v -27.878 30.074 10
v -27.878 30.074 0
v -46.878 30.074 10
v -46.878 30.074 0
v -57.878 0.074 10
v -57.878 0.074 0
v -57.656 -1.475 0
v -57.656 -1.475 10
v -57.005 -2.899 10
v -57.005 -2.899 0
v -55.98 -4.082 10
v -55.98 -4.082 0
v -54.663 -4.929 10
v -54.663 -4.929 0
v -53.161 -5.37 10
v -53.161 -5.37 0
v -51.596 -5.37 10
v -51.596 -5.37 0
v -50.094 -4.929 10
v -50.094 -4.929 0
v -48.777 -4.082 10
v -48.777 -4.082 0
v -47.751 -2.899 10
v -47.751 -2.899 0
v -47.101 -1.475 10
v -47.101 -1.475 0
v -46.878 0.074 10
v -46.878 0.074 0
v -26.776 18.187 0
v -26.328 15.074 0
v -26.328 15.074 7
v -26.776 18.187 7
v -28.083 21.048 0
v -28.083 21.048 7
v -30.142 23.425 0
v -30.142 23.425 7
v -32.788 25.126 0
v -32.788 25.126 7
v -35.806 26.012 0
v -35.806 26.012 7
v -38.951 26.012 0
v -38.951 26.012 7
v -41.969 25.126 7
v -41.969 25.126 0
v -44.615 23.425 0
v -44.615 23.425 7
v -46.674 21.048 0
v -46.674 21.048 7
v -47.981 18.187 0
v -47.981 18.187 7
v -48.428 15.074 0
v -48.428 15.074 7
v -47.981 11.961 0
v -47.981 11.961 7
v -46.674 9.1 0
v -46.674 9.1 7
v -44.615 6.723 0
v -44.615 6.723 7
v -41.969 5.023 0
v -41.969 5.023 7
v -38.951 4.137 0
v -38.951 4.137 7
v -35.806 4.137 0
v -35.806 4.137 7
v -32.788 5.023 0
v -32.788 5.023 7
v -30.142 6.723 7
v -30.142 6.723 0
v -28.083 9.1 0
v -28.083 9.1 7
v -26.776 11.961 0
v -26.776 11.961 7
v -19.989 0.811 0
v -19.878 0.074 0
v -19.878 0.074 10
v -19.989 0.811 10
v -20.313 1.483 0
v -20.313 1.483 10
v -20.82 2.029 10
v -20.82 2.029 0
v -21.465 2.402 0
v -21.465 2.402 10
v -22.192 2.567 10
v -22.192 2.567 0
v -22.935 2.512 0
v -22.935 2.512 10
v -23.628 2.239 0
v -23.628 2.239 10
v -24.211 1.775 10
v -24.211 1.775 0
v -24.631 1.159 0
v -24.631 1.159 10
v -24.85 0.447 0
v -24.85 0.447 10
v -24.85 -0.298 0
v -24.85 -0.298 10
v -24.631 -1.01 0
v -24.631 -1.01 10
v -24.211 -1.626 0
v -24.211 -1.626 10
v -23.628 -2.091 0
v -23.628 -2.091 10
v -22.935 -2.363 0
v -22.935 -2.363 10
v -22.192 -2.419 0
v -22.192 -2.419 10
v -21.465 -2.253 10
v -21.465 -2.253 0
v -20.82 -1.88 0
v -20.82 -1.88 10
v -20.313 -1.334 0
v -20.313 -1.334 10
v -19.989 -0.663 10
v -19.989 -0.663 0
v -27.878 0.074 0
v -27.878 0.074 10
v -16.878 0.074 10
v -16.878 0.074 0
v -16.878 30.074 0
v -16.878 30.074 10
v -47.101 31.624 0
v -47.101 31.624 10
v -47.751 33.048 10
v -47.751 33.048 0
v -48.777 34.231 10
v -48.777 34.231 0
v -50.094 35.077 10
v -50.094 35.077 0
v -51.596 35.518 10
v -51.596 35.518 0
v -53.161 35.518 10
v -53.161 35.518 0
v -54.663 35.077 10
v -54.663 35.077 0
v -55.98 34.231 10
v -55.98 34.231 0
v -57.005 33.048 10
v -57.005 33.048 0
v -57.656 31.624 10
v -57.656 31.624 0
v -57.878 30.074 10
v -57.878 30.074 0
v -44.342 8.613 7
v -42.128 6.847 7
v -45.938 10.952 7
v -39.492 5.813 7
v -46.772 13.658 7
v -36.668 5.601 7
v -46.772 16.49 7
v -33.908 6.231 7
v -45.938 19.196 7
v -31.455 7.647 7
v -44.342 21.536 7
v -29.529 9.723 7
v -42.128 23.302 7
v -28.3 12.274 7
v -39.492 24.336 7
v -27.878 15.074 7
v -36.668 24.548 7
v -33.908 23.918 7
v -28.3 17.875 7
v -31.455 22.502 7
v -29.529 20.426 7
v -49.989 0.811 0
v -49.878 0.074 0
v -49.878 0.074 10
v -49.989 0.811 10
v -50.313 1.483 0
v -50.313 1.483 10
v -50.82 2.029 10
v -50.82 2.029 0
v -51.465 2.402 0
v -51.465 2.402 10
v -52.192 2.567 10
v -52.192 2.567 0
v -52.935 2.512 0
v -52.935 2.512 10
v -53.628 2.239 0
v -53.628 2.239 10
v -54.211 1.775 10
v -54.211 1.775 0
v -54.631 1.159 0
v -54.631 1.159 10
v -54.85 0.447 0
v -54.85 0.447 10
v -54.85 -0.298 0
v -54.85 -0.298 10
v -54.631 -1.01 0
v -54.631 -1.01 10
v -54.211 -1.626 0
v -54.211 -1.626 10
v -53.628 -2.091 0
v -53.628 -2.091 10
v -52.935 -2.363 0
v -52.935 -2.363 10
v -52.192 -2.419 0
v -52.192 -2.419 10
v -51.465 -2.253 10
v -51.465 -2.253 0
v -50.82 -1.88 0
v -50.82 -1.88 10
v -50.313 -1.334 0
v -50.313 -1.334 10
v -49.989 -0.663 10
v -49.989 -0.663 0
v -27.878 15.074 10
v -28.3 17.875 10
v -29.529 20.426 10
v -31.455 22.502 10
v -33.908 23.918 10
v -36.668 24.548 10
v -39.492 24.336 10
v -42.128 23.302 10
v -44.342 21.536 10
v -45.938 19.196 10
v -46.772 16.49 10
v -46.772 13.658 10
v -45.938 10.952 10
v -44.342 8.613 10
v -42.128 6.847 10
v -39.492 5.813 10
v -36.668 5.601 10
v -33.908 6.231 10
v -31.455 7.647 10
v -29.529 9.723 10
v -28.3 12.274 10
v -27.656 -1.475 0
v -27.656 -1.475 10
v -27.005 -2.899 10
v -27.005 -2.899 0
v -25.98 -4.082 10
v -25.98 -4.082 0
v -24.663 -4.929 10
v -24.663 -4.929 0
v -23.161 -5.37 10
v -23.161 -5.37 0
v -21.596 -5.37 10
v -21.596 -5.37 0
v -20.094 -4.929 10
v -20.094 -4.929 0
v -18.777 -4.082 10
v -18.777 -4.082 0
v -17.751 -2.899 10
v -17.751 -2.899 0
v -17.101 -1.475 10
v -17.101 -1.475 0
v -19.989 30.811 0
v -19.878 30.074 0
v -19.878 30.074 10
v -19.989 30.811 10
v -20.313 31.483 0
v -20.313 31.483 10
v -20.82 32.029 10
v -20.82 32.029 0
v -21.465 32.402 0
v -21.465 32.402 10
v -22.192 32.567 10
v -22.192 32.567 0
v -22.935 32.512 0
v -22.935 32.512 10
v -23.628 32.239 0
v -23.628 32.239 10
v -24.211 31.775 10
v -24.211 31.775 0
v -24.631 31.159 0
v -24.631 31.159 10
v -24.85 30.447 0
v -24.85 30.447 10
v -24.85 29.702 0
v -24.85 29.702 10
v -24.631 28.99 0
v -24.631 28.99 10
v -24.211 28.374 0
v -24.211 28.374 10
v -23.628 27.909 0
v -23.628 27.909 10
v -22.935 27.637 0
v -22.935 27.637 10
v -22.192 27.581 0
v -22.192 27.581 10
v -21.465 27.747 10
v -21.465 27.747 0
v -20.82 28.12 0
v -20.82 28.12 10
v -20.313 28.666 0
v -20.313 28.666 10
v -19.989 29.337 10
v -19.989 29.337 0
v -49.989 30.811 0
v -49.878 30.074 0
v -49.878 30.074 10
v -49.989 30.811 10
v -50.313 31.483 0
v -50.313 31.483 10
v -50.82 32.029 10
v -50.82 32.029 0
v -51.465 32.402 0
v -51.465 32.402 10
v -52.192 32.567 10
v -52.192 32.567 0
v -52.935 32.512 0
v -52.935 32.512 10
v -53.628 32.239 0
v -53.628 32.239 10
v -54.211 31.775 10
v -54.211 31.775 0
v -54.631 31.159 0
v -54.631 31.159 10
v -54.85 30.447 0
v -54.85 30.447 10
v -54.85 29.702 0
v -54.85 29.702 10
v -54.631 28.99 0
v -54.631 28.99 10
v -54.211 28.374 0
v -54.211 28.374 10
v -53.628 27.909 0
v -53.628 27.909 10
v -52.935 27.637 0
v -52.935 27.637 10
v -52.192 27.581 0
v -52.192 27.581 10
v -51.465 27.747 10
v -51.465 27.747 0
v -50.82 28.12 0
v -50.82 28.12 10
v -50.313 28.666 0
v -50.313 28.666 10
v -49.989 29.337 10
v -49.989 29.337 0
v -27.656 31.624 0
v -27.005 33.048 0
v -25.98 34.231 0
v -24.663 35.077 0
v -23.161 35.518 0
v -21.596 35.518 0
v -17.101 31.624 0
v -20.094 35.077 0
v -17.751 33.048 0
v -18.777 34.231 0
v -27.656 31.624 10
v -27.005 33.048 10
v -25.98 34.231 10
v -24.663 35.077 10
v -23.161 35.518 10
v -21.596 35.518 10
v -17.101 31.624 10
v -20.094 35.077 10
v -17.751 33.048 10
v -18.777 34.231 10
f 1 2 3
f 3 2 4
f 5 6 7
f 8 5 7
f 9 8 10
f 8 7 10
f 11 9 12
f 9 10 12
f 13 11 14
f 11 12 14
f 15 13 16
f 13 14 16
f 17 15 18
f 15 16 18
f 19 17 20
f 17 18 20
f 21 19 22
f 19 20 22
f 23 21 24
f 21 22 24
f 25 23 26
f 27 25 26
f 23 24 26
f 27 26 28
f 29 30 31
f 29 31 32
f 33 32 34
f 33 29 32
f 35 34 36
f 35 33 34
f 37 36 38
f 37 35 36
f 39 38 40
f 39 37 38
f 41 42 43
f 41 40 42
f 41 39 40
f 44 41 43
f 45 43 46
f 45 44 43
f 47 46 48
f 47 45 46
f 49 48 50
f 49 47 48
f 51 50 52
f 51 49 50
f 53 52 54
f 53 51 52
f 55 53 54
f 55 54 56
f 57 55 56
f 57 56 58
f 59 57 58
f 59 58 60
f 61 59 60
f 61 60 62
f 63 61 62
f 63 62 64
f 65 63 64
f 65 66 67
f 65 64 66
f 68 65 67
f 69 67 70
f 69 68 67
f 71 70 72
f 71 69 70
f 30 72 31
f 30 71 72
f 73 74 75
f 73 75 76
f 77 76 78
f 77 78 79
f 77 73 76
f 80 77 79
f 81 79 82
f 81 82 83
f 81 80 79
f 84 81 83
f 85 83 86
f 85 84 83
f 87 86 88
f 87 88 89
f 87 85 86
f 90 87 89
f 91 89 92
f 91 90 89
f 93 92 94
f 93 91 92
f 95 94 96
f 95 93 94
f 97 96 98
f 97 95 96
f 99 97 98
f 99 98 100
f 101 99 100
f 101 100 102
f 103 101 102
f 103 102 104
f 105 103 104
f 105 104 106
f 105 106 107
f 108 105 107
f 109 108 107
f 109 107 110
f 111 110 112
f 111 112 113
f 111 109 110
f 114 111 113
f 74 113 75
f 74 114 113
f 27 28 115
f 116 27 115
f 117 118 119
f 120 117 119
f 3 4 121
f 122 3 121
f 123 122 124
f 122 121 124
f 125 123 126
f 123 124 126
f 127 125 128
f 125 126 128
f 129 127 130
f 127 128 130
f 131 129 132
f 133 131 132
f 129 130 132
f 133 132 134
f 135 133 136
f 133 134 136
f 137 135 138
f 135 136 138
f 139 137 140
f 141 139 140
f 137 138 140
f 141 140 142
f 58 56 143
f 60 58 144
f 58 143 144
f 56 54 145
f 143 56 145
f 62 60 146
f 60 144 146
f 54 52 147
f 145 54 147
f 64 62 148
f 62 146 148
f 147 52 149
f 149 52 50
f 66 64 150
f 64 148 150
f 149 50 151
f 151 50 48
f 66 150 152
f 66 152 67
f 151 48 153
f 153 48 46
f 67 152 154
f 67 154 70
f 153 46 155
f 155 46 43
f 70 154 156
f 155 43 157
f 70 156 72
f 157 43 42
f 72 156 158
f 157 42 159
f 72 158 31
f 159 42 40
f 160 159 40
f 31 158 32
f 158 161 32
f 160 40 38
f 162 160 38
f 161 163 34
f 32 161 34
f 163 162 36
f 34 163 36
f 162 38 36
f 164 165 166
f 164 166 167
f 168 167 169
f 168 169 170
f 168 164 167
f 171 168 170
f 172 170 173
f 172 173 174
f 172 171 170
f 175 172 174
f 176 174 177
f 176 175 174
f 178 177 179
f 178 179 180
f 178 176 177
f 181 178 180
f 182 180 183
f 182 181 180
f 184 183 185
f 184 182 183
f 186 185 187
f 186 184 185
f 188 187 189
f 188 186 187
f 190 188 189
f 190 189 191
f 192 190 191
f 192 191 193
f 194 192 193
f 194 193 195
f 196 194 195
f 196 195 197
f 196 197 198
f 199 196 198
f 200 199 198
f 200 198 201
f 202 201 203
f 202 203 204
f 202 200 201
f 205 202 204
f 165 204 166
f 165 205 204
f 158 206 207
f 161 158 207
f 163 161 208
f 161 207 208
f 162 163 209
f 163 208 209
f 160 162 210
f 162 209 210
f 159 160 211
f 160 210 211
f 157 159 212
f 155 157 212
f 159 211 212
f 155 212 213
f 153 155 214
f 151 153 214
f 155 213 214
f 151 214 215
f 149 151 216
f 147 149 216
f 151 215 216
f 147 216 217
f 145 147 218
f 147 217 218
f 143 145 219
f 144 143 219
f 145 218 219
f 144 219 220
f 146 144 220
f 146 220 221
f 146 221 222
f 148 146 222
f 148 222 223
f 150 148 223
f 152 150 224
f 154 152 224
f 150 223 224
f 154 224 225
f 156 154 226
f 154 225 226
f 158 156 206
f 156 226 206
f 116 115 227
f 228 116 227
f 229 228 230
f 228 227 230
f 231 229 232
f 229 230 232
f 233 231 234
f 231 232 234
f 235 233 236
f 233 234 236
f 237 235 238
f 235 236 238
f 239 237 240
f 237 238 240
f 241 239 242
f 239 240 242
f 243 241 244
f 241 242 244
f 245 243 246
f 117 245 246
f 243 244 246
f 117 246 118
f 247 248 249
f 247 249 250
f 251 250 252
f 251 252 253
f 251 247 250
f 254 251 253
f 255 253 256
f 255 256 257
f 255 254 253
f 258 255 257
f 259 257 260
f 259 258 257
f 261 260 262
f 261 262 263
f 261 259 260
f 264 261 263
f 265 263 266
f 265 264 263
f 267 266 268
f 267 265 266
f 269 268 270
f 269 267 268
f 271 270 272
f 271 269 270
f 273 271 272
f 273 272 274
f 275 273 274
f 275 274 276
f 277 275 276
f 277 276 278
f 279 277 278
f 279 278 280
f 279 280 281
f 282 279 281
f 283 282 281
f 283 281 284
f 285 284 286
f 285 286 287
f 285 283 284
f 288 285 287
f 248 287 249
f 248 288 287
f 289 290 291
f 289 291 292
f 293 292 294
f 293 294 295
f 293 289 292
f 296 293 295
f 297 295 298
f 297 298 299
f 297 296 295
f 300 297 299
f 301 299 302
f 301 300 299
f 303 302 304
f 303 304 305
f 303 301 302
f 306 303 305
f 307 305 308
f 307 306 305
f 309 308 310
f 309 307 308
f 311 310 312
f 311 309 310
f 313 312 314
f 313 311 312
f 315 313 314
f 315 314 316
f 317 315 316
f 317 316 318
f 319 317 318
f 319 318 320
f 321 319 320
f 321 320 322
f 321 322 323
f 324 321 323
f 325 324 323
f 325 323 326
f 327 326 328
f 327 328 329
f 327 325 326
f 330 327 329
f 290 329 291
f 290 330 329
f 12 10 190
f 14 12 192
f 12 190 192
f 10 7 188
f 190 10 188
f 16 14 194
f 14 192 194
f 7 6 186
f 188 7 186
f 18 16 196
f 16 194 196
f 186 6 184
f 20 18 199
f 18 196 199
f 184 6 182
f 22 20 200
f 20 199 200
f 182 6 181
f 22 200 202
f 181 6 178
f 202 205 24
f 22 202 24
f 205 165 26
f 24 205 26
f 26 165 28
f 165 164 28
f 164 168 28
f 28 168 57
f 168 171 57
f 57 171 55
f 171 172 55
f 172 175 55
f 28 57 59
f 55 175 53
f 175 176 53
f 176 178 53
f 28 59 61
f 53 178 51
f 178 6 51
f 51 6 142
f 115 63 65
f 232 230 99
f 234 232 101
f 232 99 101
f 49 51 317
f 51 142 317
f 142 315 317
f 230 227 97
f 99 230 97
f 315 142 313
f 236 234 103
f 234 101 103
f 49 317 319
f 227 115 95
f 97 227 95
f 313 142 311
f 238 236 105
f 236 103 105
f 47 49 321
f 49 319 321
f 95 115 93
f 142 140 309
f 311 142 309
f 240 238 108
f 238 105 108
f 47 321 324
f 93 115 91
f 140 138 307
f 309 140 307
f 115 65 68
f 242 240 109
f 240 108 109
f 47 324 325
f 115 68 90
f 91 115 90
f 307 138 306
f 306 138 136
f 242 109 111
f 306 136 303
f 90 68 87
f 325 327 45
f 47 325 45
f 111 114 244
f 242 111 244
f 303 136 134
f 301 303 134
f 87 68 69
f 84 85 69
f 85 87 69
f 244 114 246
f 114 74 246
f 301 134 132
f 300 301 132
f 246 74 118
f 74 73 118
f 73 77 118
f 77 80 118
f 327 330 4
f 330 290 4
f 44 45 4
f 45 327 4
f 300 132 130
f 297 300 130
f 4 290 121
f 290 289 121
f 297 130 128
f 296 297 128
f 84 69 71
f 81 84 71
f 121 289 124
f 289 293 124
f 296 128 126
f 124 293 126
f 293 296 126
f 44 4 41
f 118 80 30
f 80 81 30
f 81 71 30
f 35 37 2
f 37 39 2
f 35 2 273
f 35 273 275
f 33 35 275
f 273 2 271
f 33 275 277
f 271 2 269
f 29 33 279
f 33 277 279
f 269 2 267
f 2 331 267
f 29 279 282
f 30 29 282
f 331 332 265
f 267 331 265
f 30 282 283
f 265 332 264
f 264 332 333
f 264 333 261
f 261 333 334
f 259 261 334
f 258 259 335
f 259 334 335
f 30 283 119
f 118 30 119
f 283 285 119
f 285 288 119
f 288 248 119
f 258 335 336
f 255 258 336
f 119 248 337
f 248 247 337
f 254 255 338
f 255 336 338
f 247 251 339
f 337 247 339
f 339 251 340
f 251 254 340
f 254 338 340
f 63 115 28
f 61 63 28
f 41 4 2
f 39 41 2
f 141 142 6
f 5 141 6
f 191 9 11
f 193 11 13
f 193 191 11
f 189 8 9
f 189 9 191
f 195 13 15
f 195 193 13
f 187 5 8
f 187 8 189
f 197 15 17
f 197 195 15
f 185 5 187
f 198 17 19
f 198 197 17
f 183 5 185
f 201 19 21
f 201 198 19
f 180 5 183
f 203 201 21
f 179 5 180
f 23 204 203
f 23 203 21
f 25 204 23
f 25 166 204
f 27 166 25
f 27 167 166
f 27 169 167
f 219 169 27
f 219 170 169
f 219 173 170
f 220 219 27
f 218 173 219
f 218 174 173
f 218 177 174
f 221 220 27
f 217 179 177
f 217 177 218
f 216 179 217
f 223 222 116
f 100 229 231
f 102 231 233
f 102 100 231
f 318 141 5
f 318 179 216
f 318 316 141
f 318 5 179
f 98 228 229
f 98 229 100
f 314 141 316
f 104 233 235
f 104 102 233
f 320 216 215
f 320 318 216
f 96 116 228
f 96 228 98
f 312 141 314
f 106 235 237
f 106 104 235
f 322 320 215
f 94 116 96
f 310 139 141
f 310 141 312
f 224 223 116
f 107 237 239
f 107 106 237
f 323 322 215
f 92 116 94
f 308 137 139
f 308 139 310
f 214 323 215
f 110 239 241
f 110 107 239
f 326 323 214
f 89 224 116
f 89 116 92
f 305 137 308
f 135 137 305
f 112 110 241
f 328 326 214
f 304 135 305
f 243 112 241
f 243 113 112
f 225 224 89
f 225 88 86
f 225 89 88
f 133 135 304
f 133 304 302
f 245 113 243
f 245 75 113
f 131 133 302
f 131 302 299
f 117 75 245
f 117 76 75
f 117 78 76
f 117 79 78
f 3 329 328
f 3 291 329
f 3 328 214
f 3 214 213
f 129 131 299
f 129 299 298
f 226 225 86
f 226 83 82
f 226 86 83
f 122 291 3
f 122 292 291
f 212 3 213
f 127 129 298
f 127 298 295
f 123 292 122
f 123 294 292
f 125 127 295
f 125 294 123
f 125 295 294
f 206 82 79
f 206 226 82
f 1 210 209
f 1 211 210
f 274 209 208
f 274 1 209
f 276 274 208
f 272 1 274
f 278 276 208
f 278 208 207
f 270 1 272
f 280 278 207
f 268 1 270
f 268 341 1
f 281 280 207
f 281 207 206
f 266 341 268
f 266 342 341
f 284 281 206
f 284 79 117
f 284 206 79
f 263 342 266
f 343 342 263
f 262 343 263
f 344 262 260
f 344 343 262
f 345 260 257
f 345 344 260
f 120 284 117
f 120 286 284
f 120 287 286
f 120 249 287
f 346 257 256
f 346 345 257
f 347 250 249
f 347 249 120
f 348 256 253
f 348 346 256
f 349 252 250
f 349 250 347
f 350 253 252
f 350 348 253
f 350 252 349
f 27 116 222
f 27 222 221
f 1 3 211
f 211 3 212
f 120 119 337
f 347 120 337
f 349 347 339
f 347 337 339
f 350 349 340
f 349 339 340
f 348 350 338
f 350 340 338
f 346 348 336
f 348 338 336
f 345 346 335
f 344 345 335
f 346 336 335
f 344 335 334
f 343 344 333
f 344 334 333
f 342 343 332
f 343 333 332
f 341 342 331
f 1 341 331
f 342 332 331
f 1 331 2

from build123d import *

# Parameters (mm, degrees)
CROQUIS1_R              = 11.05
CROQUIS1_R_2            = 2.5
SALIENTE_EXTRUIR1_DEPTH = 10
CROQUIS2_R              = 13
CROQUIS2_R_2            = 9.5
SALIENTE_EXTRUIR2_DEPTH = 3


with BuildPart() as part:
    # Croquis1 → Saliente-Extruir1 (new body)
    with BuildSketch(Plane.XY):
        with BuildLine():
            Line((-57.878391193, 30.074329664), (-57.878391193, 0.074329664))
            ThreePointArc((-57.878391193, 0.074329664), (-52.378391193, -5.425670336), (-46.878391193, 0.074329664))
            Line((-46.878391193, 0.074329664), (-27.878391193, 0.074329664))
            ThreePointArc((-27.878391193, 0.074329664), (-22.378391193, -5.425670336), (-16.878391193, 0.074329664))
            Line((-16.878391193, 0.074329664), (-16.878391193, 30.074329664))
            ThreePointArc((-16.878391193, 30.074329664), (-22.378391193, 35.574329664), (-27.878391193, 30.074329664))
            Line((-27.878391193, 30.074329664), (-46.878391193, 30.074329664))
            ThreePointArc((-46.878391193, 30.074329664), (-52.378391193, 35.574329664), (-57.878391193, 30.074329664))
        make_face()
        with Locations((-37.378391193, 15.074329664)):
            Circle(CROQUIS1_R, mode=Mode.SUBTRACT)
        with Locations((-22.378391193, 0.074329664)):
            Circle(CROQUIS1_R_2, mode=Mode.SUBTRACT)
        with Locations((-52.378391193, 0.074329664)):
            Circle(CROQUIS1_R_2, mode=Mode.SUBTRACT)
        with Locations((-52.378391193, 30.074329664)):
            Circle(CROQUIS1_R_2, mode=Mode.SUBTRACT)
        with Locations((-22.378391193, 30.074329664)):
            Circle(CROQUIS1_R_2, mode=Mode.SUBTRACT)
    extrude(amount=SALIENTE_EXTRUIR1_DEPTH)

    # Croquis2 → Saliente-Extruir2 (add)
    with BuildSketch(Plane.XY.offset(10)):
        with Locations((-37.378391193, 15.074329664)):
            Circle(CROQUIS2_R)
        with Locations((-37.378391193, 15.074329664)):
            Circle(CROQUIS2_R_2, mode=Mode.SUBTRACT)
    extrude(amount=-SALIENTE_EXTRUIR2_DEPTH)


solid = part.part
